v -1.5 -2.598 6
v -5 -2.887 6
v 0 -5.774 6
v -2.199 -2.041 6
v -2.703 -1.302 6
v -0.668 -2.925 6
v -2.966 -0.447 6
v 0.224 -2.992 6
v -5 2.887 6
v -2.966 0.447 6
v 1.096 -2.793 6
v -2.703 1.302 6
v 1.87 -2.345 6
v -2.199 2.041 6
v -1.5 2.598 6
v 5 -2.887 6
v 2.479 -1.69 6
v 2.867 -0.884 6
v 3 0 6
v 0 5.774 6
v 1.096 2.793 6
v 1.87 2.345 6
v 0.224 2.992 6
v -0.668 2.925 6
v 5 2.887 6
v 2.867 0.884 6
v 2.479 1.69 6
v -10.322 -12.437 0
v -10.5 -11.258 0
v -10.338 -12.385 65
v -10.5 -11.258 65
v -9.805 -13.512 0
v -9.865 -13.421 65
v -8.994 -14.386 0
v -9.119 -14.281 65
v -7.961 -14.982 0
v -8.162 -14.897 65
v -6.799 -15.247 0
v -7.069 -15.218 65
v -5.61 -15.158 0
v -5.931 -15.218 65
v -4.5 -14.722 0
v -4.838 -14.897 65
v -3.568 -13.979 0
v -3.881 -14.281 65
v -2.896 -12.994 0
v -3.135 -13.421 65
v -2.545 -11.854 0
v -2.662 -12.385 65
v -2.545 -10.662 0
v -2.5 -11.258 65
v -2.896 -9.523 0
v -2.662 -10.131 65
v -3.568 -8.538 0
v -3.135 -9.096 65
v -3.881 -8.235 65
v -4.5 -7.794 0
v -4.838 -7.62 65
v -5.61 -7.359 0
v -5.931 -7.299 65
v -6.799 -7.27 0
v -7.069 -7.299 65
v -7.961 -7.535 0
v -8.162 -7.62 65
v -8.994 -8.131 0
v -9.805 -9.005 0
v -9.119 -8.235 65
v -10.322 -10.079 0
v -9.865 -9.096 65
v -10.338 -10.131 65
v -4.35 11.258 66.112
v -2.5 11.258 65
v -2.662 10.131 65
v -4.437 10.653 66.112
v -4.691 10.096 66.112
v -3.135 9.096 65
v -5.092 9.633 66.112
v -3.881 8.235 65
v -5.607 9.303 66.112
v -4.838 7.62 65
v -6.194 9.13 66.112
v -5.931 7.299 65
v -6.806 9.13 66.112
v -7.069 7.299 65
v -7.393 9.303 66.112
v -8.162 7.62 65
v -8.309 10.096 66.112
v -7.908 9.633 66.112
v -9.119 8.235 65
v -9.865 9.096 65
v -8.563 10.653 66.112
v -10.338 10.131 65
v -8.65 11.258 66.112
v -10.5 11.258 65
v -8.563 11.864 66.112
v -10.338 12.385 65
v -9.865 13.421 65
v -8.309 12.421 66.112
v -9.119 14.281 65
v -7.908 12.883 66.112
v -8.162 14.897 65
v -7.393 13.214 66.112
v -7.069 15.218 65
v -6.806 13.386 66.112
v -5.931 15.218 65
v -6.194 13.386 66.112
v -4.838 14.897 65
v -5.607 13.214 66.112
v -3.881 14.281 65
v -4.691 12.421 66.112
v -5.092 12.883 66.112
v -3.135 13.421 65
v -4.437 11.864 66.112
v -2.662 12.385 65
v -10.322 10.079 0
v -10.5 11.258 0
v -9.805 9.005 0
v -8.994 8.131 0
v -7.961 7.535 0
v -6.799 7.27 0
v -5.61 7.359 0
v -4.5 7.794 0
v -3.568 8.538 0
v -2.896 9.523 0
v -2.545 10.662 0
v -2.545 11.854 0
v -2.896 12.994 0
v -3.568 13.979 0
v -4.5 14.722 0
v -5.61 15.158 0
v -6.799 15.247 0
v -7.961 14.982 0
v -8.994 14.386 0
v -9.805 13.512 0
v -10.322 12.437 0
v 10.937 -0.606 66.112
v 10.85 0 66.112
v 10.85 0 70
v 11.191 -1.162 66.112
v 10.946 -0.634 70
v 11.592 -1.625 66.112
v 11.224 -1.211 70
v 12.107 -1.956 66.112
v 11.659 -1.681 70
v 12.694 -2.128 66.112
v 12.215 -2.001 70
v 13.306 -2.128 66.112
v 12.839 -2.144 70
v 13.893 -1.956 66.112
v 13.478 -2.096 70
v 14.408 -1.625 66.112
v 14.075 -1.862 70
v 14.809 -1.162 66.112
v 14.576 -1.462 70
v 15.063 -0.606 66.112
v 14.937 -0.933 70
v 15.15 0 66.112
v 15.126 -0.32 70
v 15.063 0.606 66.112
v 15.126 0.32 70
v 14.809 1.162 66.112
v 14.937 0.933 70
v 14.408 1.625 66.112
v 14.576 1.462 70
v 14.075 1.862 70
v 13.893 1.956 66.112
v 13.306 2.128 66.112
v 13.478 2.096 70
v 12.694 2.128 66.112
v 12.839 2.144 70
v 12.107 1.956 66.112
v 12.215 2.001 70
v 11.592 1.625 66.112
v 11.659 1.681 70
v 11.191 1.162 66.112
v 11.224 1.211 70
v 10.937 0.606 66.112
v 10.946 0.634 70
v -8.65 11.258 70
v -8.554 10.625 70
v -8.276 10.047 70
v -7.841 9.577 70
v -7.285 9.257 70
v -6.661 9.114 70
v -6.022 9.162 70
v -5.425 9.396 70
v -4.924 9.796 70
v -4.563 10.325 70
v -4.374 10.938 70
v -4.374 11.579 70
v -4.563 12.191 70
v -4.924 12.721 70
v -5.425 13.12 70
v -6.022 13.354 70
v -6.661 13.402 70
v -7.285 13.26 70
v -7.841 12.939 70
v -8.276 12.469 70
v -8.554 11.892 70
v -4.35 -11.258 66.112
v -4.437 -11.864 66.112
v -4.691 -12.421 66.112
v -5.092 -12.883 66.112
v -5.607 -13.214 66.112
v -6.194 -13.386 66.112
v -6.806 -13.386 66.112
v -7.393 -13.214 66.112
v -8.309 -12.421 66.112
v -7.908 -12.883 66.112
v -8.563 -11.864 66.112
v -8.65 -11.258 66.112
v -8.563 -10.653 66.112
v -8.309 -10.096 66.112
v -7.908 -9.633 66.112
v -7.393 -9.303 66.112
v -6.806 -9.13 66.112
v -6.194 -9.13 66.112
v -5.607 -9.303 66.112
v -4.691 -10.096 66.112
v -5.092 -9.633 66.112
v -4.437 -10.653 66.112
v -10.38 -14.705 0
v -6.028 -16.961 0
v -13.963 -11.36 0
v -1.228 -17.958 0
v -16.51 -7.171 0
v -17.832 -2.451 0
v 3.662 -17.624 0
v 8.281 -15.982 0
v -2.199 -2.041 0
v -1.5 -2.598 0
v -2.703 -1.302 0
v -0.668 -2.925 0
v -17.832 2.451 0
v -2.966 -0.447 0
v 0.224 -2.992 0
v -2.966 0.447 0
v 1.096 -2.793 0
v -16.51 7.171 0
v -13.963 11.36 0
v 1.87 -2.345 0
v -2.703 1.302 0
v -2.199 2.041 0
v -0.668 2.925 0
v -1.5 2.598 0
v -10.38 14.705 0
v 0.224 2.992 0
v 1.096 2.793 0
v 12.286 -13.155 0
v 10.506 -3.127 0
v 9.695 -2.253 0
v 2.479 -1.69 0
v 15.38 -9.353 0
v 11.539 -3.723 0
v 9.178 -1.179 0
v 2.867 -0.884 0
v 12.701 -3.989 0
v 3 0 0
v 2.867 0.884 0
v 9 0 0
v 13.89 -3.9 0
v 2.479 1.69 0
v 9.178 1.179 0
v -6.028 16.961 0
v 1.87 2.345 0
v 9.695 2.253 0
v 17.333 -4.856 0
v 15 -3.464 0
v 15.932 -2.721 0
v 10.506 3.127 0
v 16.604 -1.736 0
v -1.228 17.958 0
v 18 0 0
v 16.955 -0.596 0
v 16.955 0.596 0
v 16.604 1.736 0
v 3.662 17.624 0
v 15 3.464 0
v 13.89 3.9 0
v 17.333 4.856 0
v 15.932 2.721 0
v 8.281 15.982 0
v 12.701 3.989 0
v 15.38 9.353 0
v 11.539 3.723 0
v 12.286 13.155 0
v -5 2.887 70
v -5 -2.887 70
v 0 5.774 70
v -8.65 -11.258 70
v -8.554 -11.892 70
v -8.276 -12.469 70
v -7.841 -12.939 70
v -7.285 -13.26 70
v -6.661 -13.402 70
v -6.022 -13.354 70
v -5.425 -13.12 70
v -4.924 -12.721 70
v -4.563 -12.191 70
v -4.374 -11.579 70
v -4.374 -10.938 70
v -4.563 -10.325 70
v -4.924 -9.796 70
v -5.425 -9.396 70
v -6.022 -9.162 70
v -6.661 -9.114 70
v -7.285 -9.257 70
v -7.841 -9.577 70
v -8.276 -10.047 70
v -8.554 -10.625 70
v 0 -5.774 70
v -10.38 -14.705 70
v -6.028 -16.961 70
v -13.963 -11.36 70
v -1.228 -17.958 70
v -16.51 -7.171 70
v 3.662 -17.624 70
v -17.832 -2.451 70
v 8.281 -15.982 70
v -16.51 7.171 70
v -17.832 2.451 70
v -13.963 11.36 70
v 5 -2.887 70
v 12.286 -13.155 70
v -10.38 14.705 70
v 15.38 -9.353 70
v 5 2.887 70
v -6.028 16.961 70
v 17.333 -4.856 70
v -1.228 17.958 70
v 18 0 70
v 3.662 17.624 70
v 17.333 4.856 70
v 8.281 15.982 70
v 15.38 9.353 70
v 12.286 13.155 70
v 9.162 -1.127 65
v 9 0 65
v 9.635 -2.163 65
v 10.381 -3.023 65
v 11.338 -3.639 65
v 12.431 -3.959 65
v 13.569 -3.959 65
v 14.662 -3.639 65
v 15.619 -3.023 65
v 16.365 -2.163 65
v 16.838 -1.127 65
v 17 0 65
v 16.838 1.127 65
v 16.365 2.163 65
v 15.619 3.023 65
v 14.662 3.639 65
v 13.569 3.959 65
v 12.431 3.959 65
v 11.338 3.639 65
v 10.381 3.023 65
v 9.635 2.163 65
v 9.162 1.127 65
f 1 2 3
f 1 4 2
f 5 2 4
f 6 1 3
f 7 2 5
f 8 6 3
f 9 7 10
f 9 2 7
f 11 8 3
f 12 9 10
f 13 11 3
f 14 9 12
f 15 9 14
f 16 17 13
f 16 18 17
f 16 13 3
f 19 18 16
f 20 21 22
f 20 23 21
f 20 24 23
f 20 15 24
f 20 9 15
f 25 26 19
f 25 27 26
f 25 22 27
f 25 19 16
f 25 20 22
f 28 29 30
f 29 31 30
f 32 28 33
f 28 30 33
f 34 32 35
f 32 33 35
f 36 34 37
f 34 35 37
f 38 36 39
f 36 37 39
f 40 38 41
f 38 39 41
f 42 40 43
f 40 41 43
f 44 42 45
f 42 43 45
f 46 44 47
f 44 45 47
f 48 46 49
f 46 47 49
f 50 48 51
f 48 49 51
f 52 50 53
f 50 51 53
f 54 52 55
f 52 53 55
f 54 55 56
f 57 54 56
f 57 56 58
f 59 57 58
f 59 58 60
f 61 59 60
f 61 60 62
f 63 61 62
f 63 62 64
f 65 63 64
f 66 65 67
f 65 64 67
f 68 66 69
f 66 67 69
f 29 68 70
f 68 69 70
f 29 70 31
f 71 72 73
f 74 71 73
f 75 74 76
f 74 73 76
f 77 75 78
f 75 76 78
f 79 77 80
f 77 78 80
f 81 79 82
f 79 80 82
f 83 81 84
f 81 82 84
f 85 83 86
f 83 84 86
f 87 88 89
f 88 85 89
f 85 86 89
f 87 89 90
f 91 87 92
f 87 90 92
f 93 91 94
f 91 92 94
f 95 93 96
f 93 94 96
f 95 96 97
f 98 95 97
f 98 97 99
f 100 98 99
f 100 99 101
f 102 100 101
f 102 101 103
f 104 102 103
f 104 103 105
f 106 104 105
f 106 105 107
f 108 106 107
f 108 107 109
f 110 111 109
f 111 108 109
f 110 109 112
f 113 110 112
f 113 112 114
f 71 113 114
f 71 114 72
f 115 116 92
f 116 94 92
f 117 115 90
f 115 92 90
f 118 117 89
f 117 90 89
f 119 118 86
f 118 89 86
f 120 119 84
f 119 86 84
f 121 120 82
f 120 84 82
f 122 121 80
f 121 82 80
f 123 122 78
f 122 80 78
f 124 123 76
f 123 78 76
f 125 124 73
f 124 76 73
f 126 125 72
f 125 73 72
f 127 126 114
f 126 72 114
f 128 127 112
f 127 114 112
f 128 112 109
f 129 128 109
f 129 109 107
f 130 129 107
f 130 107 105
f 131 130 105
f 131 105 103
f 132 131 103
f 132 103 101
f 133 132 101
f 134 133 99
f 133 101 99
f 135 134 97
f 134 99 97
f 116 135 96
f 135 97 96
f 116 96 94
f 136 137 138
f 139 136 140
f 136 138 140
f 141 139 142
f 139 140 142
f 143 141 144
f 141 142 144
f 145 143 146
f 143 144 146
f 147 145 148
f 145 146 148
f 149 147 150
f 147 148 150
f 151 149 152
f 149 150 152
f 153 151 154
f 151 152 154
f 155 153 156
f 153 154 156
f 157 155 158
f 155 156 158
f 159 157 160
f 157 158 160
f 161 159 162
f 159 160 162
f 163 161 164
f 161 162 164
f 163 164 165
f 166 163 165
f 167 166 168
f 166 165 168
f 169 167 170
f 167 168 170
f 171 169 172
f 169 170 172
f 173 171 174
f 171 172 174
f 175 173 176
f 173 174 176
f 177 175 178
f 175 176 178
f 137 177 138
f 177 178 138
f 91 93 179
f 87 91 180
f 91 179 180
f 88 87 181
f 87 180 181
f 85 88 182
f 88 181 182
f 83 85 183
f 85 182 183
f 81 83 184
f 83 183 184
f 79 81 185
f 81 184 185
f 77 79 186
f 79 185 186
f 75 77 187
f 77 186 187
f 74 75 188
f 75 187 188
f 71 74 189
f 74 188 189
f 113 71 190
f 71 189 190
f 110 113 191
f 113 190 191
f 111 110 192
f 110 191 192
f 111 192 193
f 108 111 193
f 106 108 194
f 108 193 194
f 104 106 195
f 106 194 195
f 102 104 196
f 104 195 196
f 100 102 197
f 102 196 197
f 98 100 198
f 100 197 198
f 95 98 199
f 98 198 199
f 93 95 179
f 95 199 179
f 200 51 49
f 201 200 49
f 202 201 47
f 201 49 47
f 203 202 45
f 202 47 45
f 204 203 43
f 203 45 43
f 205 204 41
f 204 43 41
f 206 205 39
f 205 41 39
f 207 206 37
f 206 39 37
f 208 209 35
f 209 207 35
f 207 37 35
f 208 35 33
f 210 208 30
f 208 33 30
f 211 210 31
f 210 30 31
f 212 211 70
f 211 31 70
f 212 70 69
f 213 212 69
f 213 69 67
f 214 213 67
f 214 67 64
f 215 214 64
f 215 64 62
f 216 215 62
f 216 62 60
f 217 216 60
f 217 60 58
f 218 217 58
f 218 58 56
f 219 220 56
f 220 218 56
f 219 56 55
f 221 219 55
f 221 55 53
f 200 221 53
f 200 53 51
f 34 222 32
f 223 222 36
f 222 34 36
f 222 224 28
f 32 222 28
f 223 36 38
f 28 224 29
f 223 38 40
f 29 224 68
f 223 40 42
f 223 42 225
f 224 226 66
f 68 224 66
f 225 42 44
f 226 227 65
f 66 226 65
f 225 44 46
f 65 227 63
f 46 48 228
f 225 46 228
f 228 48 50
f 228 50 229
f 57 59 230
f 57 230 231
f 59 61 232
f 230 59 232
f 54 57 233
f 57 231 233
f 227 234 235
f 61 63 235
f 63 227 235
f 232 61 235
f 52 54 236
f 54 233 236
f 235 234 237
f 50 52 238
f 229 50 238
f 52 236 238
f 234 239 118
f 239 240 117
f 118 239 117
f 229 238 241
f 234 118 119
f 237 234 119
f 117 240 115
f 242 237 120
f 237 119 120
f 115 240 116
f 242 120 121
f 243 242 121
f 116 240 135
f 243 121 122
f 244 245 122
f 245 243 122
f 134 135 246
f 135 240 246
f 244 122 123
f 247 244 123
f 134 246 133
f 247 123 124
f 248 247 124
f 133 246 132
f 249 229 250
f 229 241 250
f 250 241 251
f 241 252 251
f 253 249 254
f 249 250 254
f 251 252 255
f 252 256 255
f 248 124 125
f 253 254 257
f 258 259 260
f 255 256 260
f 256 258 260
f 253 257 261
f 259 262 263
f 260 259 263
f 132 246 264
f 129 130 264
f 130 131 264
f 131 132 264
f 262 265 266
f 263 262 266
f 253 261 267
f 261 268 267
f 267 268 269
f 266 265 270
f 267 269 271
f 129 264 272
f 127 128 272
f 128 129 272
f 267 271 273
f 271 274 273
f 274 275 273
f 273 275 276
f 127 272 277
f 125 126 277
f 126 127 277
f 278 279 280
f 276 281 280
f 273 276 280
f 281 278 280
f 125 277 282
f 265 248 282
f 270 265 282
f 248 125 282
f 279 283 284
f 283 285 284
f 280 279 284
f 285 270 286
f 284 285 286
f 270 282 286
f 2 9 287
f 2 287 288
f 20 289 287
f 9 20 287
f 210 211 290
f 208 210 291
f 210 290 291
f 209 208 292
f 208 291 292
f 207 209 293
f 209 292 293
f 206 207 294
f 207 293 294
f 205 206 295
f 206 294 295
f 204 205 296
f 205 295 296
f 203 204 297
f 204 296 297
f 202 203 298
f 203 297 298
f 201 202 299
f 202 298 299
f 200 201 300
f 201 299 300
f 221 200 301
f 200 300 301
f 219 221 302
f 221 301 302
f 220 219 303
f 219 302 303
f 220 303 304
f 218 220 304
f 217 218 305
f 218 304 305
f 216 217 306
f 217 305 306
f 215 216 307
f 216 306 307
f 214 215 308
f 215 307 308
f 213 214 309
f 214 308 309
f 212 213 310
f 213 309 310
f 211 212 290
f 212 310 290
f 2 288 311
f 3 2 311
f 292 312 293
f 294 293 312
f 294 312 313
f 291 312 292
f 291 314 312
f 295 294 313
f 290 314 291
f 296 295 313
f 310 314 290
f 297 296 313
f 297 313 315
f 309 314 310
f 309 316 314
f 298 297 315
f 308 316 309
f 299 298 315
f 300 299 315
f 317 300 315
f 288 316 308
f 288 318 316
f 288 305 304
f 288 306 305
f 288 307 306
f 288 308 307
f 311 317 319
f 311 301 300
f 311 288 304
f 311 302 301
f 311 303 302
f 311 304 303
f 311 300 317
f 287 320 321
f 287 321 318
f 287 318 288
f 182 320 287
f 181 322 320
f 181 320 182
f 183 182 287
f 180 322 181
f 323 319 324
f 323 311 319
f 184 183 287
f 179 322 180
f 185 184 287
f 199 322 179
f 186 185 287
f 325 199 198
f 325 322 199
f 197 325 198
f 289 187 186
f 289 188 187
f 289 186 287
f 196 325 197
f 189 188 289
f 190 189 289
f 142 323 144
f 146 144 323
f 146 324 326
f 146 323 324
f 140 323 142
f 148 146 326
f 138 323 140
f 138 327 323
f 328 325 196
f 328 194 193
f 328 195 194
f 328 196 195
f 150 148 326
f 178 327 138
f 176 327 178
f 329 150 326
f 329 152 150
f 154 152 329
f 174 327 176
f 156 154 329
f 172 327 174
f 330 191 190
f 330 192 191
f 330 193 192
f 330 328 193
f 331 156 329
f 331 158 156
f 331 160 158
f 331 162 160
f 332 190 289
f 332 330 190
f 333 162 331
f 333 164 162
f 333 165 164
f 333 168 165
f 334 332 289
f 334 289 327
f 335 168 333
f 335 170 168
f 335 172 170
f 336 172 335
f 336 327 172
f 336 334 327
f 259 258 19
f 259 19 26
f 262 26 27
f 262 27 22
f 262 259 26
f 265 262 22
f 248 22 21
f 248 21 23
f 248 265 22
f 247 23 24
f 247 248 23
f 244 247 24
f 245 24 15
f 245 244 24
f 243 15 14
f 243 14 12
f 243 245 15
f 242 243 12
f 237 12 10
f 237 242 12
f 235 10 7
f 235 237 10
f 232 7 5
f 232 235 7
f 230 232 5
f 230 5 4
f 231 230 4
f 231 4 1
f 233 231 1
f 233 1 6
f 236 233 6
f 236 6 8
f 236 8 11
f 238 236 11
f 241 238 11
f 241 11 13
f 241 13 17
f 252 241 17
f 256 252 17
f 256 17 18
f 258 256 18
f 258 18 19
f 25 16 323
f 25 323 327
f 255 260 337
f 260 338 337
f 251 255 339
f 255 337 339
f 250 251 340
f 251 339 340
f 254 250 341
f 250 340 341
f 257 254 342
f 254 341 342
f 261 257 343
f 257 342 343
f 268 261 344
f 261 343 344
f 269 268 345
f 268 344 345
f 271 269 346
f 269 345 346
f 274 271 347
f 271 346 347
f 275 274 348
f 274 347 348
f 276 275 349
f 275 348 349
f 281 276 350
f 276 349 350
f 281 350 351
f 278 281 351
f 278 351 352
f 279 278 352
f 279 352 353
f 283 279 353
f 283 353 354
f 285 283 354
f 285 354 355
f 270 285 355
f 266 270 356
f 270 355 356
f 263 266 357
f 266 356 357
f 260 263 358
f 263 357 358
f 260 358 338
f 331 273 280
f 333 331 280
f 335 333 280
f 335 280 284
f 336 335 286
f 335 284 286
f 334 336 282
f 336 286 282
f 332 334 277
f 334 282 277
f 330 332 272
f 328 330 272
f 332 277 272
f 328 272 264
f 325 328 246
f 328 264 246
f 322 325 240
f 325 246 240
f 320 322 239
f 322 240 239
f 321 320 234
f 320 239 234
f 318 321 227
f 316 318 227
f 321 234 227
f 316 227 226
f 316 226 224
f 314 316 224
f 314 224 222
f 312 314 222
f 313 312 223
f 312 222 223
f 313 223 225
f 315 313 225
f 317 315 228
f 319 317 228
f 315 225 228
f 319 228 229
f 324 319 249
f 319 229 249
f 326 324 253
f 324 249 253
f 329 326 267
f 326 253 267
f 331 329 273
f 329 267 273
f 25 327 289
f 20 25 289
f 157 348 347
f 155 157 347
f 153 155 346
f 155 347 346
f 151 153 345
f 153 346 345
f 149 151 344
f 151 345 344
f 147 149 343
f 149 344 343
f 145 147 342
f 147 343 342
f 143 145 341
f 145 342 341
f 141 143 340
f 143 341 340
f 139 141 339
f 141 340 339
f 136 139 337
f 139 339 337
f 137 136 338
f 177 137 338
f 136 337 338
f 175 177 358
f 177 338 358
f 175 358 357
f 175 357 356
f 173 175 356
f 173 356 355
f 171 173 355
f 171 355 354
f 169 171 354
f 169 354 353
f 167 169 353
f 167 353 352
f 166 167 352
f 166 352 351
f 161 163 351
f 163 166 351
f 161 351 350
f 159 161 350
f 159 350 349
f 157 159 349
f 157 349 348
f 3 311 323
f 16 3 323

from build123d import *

# Parameters (mm, degrees)
F0_R     = 18
F0_R_2   = 3
F1_DEPTH = 70
F2_R     = 3
F3_DEPTH = 64
F4_D     = 4.3
F5_D     = 8
F5_DEPTH = 65
F5_TIP   = 2.4034424761


with BuildPart() as f1:
    # F0 (on Top) → F1 (new body)
    with BuildSketch(Plane.XY):
        Circle(F0_R)
        Circle(F0_R_2, mode=Mode.SUBTRACT)
    extrude(amount=F1_DEPTH)

    # F2 (on face) → F3 (cut)
    with BuildSketch(Plane.XY.offset(70)):
        Polygon((5, -2.8867513459), (5, 2.8867513459), (0, 5.7735026919), (-5, 2.8867513459), (-5, -2.8867513459), (0, -5.7735026919), align=None)
        Circle(F2_R, mode=Mode.SUBTRACT)
    extrude(amount=-F3_DEPTH, mode=Mode.SUBTRACT)

    # F4 (through all)
    with Locations(Plane(origin=(0, 0, 0), x_dir=(1, 0, 0), z_dir=(0, 0, -1))):
        with Locations((13, 0), (-6.5, -11.2583302492), (-6.5, 11.2583302492)):
            Hole(F4_D / 2)

    # F5
    with Locations(Plane(origin=(0, 0, 0), x_dir=(1, 0, 0), z_dir=(0, 0, -1))):
        with Locations((13, 0), (-6.5, -11.2583302492), (-6.5, 11.2583302492)):
            Hole(F5_D / 2, depth=F5_DEPTH)
            with Locations((0, 0, -(F5_DEPTH + F5_TIP / 2))):  # 118° drill point
                Cone(0, F5_D / 2, F5_TIP, mode=Mode.SUBTRACT)


solid = f1.part
